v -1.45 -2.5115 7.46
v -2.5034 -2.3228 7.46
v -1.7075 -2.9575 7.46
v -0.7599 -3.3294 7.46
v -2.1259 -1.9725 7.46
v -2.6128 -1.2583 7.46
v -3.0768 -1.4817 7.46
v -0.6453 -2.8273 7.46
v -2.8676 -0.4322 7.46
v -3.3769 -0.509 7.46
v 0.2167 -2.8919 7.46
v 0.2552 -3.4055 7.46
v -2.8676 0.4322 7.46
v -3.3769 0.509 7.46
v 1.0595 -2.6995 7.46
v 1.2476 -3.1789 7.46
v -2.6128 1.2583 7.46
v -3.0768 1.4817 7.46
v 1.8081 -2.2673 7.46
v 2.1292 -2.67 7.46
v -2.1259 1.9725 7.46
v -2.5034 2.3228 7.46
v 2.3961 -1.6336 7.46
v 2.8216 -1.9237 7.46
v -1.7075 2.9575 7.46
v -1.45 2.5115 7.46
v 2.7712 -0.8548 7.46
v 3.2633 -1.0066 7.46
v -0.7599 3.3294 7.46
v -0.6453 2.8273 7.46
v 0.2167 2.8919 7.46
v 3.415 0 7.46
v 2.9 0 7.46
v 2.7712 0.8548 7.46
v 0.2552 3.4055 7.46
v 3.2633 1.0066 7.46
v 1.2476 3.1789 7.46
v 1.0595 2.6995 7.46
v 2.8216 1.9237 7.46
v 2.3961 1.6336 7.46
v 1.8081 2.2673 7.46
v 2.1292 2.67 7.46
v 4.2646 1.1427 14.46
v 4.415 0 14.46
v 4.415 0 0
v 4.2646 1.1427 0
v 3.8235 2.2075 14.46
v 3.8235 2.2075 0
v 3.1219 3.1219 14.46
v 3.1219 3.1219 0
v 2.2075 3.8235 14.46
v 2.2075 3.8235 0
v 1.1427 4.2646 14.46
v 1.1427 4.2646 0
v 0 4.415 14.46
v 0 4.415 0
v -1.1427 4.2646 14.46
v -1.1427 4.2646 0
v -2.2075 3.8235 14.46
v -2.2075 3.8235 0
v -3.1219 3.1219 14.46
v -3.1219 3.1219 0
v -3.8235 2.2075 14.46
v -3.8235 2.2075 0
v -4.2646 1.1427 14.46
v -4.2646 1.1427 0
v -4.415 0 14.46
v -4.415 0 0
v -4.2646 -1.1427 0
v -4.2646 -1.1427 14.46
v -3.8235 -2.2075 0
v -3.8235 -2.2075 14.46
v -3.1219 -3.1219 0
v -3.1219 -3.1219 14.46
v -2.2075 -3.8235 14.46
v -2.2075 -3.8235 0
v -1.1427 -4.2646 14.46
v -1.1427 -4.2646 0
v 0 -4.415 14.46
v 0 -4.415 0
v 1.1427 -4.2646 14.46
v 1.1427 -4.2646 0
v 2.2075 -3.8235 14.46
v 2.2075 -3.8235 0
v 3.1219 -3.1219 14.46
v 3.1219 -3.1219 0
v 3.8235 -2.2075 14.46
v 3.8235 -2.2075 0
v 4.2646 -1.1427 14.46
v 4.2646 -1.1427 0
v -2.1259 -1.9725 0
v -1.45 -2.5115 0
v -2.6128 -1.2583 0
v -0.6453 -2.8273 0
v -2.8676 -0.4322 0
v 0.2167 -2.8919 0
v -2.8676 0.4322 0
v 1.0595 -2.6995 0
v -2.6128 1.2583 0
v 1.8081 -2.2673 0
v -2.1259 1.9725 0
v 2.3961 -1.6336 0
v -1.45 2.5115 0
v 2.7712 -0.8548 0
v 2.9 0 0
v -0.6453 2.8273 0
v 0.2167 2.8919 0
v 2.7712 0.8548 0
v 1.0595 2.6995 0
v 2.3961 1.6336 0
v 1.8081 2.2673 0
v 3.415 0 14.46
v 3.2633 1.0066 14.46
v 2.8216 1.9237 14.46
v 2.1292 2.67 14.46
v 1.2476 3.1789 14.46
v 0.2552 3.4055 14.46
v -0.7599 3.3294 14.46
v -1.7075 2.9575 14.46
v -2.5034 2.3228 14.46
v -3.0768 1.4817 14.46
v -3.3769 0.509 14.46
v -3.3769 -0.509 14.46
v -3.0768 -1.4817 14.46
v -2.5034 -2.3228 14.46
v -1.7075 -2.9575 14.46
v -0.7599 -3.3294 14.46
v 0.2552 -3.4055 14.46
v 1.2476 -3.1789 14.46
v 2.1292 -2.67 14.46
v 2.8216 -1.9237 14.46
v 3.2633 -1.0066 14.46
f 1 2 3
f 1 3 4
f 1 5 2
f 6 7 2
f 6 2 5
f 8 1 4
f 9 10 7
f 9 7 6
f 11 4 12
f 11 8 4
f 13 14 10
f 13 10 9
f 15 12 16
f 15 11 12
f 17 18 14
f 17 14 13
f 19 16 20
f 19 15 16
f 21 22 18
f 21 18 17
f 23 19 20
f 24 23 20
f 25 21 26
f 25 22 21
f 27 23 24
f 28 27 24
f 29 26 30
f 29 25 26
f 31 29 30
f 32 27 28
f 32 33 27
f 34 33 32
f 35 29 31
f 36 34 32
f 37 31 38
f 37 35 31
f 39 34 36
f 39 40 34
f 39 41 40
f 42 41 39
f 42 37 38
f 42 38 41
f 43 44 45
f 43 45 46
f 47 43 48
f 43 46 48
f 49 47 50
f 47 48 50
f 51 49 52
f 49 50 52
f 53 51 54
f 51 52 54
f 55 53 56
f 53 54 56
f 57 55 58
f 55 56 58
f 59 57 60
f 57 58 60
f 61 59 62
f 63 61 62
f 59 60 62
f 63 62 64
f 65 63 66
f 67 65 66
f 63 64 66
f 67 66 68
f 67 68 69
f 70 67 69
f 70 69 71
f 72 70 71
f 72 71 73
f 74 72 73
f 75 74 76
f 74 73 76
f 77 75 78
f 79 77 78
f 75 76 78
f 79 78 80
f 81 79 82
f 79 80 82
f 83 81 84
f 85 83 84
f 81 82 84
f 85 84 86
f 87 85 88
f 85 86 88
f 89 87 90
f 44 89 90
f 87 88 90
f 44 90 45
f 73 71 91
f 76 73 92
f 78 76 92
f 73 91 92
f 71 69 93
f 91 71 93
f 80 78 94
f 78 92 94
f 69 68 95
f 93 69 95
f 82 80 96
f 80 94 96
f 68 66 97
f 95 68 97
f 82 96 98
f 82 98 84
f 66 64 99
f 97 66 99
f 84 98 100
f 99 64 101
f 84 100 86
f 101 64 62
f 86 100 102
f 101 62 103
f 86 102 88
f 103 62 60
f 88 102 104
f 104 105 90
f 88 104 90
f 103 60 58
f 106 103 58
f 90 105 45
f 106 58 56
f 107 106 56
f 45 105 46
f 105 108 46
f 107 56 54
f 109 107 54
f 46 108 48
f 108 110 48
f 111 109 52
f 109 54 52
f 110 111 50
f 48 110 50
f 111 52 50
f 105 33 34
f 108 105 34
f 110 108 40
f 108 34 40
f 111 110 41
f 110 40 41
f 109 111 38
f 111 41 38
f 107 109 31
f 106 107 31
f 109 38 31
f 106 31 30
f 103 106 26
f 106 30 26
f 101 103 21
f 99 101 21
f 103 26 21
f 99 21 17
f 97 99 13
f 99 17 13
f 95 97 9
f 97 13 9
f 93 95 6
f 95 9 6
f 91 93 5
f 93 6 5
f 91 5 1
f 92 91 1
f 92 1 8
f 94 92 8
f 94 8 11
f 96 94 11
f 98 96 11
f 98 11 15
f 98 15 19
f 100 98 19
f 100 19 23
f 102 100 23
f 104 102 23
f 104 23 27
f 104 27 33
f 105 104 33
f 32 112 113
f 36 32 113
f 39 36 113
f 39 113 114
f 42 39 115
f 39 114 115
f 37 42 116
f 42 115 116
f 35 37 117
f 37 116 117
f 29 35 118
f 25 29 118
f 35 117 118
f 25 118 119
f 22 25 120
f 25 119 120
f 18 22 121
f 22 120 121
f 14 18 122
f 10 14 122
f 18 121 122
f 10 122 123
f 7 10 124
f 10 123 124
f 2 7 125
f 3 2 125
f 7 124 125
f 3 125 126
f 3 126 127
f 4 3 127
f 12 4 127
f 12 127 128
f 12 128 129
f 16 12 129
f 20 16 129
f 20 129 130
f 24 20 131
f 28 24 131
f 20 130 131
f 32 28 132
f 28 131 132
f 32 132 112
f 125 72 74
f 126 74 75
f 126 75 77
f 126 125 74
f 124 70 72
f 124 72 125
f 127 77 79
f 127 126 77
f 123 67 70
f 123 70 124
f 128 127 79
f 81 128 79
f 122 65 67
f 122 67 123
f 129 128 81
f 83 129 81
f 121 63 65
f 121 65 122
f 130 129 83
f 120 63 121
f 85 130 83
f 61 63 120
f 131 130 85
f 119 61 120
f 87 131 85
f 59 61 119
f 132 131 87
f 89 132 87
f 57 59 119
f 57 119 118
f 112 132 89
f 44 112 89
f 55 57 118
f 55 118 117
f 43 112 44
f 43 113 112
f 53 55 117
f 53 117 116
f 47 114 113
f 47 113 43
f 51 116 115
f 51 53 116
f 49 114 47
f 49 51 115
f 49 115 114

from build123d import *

# Parameters (mm, degrees)
ESQUISSE1_R             = 4.415
BOSS_EXTRU_1_DEPTH      = 14.46
ESQUISSE4_R             = 2.9
ENL_V_MAT_EXTRU_1_DEPTH = 14.46
ESQUISSE6_R             = 3.415
ENL_V_MAT_EXTRU_2_DEPTH = 7


with BuildPart() as part:
    # Esquisse1 → Boss.-Extru.1 (new body)
    with BuildSketch(Plane.XY):
        Circle(ESQUISSE1_R)
    extrude(amount=BOSS_EXTRU_1_DEPTH)

    # Esquisse4 → Enlèv. mat.-Extru.1 (cut)
    with BuildSketch(Plane.XY.offset(14.46)):
        Circle(ESQUISSE4_R)
    extrude(amount=-ENL_V_MAT_EXTRU_1_DEPTH, mode=Mode.SUBTRACT)

    # Esquisse6 → Enlèv. mat.-Extru.2 (cut)
    with BuildSketch(Plane.XY.offset(14.46)):
        Circle(ESQUISSE6_R)
    extrude(amount=-ENL_V_MAT_EXTRU_2_DEPTH, mode=Mode.SUBTRACT)


solid = part.part
